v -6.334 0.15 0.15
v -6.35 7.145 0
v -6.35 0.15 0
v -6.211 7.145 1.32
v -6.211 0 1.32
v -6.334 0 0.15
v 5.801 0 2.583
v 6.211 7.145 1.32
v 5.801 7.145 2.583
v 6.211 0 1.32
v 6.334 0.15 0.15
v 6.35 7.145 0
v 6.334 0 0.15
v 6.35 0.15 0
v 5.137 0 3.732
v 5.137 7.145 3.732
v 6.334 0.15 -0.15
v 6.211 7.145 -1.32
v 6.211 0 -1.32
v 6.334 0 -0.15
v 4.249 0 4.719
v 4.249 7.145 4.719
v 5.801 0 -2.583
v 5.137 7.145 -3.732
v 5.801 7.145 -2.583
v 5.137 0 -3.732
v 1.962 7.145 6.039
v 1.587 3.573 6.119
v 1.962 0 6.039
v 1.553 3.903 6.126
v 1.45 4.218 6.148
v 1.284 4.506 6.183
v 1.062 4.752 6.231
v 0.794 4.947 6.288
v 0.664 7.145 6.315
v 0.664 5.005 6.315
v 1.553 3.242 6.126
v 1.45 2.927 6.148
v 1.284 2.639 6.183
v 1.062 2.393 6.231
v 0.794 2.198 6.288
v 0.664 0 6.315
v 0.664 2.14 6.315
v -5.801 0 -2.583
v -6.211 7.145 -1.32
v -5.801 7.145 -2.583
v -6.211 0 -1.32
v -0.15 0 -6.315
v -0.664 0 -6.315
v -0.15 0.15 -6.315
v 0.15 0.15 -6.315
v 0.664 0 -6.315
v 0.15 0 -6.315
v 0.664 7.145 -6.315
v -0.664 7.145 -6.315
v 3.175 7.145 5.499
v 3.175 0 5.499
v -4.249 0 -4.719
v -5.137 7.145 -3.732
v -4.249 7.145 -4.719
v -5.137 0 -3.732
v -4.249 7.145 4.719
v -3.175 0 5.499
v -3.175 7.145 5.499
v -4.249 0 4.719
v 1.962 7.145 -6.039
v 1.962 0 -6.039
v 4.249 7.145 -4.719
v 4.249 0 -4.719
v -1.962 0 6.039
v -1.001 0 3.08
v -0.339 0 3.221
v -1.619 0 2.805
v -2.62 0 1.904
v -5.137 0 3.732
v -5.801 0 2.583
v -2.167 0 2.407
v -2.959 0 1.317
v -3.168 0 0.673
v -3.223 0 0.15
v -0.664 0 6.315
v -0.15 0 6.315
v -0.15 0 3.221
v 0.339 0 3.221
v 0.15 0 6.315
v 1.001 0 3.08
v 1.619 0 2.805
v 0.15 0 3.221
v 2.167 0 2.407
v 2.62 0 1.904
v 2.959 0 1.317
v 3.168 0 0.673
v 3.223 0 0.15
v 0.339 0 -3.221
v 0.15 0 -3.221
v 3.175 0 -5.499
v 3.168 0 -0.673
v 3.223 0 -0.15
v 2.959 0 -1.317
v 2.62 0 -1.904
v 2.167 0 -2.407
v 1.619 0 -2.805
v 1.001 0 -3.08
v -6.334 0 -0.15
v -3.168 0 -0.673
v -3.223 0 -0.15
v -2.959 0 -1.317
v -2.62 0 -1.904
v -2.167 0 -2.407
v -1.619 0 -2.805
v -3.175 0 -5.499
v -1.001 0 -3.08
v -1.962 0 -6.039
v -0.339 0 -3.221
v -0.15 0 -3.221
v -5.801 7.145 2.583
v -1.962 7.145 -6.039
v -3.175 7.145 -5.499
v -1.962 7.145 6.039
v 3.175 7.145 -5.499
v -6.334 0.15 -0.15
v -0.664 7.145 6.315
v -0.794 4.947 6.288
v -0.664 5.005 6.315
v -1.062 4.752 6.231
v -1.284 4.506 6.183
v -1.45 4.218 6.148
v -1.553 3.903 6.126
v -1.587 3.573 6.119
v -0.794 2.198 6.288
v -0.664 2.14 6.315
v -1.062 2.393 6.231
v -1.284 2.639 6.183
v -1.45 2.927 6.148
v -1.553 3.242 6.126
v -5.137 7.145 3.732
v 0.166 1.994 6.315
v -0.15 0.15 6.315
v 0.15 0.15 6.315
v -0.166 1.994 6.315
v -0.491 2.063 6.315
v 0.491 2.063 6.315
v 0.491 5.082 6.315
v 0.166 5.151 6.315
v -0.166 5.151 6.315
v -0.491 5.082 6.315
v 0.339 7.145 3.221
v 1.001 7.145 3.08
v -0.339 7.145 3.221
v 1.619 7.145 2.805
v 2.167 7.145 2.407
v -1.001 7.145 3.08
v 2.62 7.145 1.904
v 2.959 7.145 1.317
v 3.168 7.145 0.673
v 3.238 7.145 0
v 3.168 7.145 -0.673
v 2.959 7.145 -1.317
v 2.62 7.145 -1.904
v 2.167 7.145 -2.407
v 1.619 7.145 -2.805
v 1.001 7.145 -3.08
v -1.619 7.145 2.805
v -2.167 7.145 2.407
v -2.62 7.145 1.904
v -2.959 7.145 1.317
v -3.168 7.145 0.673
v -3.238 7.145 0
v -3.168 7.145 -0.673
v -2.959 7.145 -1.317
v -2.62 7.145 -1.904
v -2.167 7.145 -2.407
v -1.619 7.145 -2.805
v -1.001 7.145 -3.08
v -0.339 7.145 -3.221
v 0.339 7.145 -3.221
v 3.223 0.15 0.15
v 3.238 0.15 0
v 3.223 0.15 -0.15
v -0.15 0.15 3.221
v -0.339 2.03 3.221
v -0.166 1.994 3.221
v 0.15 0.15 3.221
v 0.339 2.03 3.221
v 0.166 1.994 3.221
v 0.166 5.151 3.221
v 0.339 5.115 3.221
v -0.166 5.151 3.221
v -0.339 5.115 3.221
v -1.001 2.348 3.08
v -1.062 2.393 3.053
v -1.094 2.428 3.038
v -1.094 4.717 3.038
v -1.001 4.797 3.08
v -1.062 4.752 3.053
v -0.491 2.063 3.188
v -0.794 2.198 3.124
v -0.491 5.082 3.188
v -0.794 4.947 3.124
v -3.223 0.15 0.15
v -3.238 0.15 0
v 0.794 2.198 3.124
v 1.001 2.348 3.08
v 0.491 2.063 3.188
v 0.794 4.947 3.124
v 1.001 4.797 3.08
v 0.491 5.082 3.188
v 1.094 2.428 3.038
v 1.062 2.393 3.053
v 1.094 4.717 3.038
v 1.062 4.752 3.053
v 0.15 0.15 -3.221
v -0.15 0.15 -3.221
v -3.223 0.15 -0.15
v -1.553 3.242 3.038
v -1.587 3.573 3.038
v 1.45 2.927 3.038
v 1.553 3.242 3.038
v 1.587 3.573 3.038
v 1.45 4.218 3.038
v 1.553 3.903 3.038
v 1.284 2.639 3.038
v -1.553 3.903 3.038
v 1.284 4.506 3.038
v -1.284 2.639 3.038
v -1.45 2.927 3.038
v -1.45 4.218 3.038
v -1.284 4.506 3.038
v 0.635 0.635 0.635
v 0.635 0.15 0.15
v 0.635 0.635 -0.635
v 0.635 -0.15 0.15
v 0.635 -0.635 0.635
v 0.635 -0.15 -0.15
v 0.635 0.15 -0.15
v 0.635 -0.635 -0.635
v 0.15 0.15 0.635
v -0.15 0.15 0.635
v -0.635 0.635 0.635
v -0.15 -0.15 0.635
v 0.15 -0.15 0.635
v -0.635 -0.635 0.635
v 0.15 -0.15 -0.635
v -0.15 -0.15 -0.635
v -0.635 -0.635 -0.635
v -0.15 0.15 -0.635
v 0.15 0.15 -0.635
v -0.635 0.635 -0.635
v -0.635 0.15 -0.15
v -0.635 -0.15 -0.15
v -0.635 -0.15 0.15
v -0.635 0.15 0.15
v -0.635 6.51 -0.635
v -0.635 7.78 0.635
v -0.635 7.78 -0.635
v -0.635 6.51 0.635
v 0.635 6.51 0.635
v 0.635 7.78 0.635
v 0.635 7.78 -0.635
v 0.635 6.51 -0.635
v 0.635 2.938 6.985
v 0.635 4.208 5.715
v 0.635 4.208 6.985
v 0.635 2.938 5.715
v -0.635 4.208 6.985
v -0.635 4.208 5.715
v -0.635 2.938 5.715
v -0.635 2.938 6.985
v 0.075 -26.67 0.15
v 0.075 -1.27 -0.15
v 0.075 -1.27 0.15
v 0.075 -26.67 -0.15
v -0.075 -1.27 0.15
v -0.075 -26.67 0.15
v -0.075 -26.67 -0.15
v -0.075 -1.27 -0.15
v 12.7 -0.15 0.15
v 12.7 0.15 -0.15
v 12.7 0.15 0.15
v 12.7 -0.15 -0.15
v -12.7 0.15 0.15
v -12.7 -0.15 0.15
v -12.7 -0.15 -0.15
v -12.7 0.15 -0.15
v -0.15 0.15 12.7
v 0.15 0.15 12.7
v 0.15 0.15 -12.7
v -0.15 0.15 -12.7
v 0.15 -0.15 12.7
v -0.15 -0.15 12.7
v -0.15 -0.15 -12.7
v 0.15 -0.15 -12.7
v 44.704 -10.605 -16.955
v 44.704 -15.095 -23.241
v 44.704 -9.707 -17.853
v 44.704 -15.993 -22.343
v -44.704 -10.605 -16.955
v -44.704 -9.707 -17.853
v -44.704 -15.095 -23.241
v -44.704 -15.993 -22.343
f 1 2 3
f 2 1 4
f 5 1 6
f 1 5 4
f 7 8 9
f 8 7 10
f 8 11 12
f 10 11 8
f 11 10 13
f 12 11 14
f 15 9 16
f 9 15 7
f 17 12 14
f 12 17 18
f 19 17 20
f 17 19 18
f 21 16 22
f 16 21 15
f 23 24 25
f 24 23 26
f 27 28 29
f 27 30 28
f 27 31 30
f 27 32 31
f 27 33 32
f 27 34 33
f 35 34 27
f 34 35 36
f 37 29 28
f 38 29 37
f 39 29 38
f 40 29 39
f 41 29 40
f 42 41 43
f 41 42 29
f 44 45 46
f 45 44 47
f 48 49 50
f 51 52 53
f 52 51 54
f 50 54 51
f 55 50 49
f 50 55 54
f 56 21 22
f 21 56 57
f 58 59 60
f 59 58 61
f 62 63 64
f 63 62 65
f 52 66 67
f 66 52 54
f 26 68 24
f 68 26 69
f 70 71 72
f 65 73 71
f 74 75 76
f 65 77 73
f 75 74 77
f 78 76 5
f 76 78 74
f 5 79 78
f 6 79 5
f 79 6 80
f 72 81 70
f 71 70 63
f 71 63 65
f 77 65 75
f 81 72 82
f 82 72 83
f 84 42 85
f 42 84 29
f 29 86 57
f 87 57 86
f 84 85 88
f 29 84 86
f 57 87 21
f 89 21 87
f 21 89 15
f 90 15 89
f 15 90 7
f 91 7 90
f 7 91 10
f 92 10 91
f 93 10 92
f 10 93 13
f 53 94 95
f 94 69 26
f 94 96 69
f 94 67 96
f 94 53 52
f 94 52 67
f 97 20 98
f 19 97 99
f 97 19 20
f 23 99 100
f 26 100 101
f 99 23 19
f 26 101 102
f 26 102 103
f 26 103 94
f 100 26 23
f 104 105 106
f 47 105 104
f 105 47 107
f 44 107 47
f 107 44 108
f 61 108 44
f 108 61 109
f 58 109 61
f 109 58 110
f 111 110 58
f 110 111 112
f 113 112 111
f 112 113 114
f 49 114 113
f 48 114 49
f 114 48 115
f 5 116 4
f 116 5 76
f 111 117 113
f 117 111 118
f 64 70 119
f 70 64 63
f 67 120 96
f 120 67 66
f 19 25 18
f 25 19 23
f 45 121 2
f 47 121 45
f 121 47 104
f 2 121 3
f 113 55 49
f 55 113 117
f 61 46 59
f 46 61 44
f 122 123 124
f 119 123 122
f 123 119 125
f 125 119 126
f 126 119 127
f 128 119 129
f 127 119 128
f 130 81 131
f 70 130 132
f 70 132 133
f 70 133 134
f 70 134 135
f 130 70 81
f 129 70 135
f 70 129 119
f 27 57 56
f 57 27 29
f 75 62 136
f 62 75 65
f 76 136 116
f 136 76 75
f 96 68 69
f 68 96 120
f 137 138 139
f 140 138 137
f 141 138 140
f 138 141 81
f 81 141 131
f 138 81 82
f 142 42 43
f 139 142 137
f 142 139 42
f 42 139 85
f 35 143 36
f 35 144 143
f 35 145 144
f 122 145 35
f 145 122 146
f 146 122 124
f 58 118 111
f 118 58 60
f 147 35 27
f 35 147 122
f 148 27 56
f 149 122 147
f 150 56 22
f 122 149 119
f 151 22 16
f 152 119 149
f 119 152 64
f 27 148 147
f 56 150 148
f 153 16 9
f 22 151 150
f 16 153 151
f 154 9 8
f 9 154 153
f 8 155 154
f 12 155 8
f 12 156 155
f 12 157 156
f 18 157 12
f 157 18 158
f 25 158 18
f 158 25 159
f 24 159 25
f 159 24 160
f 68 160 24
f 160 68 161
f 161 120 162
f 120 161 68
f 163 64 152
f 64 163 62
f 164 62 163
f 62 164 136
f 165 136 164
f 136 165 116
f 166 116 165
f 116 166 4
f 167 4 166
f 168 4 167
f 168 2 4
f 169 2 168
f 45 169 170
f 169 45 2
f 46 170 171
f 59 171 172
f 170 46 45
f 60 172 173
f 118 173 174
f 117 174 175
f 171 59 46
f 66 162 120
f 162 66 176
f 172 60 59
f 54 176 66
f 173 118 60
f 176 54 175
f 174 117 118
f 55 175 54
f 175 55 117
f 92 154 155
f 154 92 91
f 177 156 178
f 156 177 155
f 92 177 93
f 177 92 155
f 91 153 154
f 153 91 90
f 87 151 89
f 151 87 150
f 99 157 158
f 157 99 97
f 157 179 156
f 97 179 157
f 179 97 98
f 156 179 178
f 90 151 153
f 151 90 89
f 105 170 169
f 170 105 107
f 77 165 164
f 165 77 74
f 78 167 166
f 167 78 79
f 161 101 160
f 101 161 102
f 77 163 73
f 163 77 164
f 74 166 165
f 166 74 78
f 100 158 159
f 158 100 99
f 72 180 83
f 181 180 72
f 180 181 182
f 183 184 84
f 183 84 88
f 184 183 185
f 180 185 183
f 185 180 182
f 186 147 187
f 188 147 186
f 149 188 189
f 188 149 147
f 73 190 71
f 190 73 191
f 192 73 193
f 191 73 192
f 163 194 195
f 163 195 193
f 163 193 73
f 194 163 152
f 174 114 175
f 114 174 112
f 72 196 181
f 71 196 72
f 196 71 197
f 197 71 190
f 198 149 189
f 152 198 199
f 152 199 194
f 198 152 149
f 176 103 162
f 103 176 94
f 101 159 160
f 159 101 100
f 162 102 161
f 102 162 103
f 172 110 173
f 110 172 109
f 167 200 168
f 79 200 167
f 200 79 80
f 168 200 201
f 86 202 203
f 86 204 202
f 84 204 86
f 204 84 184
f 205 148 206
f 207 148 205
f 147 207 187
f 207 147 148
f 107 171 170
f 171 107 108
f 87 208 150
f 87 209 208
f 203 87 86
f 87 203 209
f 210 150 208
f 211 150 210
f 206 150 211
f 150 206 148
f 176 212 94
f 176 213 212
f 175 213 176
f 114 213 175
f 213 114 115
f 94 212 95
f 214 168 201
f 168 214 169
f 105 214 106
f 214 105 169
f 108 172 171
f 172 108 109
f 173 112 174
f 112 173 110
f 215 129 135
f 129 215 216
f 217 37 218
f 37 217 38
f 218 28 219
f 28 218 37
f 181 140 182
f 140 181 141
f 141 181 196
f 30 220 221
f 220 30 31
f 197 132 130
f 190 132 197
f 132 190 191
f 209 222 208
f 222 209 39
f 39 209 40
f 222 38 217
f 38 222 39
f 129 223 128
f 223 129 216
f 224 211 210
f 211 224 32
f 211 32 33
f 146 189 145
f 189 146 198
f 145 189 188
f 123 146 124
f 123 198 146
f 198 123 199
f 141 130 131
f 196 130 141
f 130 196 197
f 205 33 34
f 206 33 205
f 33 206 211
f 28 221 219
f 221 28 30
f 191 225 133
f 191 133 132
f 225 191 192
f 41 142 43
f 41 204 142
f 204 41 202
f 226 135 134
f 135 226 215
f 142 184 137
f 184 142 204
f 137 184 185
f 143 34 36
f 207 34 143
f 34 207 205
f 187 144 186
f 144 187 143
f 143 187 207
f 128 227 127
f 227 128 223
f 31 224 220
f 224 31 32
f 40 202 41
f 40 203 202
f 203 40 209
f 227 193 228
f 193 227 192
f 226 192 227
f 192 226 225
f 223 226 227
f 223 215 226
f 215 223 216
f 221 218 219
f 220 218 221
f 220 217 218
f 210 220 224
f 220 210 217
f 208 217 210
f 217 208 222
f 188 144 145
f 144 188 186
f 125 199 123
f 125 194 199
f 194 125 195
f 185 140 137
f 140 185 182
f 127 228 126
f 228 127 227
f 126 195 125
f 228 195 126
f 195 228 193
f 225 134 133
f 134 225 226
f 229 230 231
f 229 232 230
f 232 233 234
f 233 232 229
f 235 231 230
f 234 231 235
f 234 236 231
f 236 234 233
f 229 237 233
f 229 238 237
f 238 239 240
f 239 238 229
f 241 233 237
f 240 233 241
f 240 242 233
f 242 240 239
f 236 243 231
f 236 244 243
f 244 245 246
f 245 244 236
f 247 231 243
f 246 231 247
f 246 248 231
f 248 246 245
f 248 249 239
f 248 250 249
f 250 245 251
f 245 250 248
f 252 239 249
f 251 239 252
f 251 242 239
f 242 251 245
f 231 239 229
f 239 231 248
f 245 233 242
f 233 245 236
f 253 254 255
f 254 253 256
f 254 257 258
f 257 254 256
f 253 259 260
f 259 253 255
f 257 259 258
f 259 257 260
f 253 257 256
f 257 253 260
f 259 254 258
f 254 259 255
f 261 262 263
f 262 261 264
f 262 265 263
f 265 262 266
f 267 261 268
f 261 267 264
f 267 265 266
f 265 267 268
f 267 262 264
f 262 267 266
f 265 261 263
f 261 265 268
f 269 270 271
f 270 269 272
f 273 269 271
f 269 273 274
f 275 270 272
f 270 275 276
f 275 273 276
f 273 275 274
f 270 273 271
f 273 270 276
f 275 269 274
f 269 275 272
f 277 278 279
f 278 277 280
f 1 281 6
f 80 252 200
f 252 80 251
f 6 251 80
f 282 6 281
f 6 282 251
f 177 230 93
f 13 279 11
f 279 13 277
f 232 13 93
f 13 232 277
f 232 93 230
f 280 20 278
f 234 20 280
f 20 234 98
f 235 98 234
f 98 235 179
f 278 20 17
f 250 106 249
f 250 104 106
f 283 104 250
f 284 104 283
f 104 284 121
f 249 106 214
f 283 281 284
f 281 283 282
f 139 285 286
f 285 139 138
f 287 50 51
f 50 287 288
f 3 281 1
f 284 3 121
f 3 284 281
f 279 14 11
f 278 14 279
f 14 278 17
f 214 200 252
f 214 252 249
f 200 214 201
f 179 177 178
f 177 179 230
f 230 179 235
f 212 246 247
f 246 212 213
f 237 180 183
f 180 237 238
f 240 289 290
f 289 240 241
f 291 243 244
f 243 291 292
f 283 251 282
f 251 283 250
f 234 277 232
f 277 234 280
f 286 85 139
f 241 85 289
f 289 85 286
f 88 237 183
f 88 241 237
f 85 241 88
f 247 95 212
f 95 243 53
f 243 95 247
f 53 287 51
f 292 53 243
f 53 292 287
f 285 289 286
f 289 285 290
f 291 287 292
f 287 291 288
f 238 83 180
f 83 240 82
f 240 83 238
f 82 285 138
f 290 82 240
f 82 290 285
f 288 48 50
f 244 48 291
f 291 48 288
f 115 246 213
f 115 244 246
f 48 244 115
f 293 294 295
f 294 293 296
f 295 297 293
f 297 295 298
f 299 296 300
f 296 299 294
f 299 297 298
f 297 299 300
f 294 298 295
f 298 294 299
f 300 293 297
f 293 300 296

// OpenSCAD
include <../mo/mo.scad>

CollarDepth = 0.2813 * in;
CollarOutsideDiameter = 0.5 * in;
CollarInsideDiameter = 0.255 * in;
CollarThickness = ( CollarOutsideDiameter - CollarInsideDiameter ) / 2;
CollarSetScrewDiameter = 0.125 * in;

positions = [
  [ [ 0, 0, 0 ], [ 0, 0, 1 ], 0 ],
  [ [ 0, CollarDepth, 0 ], [ 0, 0, 1 ], 180 ],
  [ [ 0, CollarDepth/2, CollarOutsideDiameter/2 ], [ 1, 0, 0 ], -90 ],
];

module actCollarSetScrew0_25( p = 0, info = false ) {
  moPresent( positions, p, info )
    moPose( [ 90, 0, 0 ], [ 0, CollarDepth / 2, 0 ] ) {
      difference() {
        color( Steel ) 
          cylinder( h = CollarDepth, d = CollarOutsideDiameter, center = true );
        color( Steel ) 
          cylinder( h = CollarDepth + Epsilon, d = CollarInsideDiameter, center = true );
        moPose( [ 90, 0, 0 ], [ 0, CollarInsideDiameter / 2 + CollarThickness / 2 , 0 ] )
          color( Steel ) 
            cylinder( h = CollarThickness + 4 * Epsilon, d = CollarSetScrewDiameter, center = true );
      }
  }
    
}

function actCollarSetScrew0_25Position( p = 0 ) = positions[ p ];

moMoveOriginTo( actCollarSetScrew0_25Position( 0 ) )
  actCollarSetScrew0_25( 0, info = true, $name = true );
